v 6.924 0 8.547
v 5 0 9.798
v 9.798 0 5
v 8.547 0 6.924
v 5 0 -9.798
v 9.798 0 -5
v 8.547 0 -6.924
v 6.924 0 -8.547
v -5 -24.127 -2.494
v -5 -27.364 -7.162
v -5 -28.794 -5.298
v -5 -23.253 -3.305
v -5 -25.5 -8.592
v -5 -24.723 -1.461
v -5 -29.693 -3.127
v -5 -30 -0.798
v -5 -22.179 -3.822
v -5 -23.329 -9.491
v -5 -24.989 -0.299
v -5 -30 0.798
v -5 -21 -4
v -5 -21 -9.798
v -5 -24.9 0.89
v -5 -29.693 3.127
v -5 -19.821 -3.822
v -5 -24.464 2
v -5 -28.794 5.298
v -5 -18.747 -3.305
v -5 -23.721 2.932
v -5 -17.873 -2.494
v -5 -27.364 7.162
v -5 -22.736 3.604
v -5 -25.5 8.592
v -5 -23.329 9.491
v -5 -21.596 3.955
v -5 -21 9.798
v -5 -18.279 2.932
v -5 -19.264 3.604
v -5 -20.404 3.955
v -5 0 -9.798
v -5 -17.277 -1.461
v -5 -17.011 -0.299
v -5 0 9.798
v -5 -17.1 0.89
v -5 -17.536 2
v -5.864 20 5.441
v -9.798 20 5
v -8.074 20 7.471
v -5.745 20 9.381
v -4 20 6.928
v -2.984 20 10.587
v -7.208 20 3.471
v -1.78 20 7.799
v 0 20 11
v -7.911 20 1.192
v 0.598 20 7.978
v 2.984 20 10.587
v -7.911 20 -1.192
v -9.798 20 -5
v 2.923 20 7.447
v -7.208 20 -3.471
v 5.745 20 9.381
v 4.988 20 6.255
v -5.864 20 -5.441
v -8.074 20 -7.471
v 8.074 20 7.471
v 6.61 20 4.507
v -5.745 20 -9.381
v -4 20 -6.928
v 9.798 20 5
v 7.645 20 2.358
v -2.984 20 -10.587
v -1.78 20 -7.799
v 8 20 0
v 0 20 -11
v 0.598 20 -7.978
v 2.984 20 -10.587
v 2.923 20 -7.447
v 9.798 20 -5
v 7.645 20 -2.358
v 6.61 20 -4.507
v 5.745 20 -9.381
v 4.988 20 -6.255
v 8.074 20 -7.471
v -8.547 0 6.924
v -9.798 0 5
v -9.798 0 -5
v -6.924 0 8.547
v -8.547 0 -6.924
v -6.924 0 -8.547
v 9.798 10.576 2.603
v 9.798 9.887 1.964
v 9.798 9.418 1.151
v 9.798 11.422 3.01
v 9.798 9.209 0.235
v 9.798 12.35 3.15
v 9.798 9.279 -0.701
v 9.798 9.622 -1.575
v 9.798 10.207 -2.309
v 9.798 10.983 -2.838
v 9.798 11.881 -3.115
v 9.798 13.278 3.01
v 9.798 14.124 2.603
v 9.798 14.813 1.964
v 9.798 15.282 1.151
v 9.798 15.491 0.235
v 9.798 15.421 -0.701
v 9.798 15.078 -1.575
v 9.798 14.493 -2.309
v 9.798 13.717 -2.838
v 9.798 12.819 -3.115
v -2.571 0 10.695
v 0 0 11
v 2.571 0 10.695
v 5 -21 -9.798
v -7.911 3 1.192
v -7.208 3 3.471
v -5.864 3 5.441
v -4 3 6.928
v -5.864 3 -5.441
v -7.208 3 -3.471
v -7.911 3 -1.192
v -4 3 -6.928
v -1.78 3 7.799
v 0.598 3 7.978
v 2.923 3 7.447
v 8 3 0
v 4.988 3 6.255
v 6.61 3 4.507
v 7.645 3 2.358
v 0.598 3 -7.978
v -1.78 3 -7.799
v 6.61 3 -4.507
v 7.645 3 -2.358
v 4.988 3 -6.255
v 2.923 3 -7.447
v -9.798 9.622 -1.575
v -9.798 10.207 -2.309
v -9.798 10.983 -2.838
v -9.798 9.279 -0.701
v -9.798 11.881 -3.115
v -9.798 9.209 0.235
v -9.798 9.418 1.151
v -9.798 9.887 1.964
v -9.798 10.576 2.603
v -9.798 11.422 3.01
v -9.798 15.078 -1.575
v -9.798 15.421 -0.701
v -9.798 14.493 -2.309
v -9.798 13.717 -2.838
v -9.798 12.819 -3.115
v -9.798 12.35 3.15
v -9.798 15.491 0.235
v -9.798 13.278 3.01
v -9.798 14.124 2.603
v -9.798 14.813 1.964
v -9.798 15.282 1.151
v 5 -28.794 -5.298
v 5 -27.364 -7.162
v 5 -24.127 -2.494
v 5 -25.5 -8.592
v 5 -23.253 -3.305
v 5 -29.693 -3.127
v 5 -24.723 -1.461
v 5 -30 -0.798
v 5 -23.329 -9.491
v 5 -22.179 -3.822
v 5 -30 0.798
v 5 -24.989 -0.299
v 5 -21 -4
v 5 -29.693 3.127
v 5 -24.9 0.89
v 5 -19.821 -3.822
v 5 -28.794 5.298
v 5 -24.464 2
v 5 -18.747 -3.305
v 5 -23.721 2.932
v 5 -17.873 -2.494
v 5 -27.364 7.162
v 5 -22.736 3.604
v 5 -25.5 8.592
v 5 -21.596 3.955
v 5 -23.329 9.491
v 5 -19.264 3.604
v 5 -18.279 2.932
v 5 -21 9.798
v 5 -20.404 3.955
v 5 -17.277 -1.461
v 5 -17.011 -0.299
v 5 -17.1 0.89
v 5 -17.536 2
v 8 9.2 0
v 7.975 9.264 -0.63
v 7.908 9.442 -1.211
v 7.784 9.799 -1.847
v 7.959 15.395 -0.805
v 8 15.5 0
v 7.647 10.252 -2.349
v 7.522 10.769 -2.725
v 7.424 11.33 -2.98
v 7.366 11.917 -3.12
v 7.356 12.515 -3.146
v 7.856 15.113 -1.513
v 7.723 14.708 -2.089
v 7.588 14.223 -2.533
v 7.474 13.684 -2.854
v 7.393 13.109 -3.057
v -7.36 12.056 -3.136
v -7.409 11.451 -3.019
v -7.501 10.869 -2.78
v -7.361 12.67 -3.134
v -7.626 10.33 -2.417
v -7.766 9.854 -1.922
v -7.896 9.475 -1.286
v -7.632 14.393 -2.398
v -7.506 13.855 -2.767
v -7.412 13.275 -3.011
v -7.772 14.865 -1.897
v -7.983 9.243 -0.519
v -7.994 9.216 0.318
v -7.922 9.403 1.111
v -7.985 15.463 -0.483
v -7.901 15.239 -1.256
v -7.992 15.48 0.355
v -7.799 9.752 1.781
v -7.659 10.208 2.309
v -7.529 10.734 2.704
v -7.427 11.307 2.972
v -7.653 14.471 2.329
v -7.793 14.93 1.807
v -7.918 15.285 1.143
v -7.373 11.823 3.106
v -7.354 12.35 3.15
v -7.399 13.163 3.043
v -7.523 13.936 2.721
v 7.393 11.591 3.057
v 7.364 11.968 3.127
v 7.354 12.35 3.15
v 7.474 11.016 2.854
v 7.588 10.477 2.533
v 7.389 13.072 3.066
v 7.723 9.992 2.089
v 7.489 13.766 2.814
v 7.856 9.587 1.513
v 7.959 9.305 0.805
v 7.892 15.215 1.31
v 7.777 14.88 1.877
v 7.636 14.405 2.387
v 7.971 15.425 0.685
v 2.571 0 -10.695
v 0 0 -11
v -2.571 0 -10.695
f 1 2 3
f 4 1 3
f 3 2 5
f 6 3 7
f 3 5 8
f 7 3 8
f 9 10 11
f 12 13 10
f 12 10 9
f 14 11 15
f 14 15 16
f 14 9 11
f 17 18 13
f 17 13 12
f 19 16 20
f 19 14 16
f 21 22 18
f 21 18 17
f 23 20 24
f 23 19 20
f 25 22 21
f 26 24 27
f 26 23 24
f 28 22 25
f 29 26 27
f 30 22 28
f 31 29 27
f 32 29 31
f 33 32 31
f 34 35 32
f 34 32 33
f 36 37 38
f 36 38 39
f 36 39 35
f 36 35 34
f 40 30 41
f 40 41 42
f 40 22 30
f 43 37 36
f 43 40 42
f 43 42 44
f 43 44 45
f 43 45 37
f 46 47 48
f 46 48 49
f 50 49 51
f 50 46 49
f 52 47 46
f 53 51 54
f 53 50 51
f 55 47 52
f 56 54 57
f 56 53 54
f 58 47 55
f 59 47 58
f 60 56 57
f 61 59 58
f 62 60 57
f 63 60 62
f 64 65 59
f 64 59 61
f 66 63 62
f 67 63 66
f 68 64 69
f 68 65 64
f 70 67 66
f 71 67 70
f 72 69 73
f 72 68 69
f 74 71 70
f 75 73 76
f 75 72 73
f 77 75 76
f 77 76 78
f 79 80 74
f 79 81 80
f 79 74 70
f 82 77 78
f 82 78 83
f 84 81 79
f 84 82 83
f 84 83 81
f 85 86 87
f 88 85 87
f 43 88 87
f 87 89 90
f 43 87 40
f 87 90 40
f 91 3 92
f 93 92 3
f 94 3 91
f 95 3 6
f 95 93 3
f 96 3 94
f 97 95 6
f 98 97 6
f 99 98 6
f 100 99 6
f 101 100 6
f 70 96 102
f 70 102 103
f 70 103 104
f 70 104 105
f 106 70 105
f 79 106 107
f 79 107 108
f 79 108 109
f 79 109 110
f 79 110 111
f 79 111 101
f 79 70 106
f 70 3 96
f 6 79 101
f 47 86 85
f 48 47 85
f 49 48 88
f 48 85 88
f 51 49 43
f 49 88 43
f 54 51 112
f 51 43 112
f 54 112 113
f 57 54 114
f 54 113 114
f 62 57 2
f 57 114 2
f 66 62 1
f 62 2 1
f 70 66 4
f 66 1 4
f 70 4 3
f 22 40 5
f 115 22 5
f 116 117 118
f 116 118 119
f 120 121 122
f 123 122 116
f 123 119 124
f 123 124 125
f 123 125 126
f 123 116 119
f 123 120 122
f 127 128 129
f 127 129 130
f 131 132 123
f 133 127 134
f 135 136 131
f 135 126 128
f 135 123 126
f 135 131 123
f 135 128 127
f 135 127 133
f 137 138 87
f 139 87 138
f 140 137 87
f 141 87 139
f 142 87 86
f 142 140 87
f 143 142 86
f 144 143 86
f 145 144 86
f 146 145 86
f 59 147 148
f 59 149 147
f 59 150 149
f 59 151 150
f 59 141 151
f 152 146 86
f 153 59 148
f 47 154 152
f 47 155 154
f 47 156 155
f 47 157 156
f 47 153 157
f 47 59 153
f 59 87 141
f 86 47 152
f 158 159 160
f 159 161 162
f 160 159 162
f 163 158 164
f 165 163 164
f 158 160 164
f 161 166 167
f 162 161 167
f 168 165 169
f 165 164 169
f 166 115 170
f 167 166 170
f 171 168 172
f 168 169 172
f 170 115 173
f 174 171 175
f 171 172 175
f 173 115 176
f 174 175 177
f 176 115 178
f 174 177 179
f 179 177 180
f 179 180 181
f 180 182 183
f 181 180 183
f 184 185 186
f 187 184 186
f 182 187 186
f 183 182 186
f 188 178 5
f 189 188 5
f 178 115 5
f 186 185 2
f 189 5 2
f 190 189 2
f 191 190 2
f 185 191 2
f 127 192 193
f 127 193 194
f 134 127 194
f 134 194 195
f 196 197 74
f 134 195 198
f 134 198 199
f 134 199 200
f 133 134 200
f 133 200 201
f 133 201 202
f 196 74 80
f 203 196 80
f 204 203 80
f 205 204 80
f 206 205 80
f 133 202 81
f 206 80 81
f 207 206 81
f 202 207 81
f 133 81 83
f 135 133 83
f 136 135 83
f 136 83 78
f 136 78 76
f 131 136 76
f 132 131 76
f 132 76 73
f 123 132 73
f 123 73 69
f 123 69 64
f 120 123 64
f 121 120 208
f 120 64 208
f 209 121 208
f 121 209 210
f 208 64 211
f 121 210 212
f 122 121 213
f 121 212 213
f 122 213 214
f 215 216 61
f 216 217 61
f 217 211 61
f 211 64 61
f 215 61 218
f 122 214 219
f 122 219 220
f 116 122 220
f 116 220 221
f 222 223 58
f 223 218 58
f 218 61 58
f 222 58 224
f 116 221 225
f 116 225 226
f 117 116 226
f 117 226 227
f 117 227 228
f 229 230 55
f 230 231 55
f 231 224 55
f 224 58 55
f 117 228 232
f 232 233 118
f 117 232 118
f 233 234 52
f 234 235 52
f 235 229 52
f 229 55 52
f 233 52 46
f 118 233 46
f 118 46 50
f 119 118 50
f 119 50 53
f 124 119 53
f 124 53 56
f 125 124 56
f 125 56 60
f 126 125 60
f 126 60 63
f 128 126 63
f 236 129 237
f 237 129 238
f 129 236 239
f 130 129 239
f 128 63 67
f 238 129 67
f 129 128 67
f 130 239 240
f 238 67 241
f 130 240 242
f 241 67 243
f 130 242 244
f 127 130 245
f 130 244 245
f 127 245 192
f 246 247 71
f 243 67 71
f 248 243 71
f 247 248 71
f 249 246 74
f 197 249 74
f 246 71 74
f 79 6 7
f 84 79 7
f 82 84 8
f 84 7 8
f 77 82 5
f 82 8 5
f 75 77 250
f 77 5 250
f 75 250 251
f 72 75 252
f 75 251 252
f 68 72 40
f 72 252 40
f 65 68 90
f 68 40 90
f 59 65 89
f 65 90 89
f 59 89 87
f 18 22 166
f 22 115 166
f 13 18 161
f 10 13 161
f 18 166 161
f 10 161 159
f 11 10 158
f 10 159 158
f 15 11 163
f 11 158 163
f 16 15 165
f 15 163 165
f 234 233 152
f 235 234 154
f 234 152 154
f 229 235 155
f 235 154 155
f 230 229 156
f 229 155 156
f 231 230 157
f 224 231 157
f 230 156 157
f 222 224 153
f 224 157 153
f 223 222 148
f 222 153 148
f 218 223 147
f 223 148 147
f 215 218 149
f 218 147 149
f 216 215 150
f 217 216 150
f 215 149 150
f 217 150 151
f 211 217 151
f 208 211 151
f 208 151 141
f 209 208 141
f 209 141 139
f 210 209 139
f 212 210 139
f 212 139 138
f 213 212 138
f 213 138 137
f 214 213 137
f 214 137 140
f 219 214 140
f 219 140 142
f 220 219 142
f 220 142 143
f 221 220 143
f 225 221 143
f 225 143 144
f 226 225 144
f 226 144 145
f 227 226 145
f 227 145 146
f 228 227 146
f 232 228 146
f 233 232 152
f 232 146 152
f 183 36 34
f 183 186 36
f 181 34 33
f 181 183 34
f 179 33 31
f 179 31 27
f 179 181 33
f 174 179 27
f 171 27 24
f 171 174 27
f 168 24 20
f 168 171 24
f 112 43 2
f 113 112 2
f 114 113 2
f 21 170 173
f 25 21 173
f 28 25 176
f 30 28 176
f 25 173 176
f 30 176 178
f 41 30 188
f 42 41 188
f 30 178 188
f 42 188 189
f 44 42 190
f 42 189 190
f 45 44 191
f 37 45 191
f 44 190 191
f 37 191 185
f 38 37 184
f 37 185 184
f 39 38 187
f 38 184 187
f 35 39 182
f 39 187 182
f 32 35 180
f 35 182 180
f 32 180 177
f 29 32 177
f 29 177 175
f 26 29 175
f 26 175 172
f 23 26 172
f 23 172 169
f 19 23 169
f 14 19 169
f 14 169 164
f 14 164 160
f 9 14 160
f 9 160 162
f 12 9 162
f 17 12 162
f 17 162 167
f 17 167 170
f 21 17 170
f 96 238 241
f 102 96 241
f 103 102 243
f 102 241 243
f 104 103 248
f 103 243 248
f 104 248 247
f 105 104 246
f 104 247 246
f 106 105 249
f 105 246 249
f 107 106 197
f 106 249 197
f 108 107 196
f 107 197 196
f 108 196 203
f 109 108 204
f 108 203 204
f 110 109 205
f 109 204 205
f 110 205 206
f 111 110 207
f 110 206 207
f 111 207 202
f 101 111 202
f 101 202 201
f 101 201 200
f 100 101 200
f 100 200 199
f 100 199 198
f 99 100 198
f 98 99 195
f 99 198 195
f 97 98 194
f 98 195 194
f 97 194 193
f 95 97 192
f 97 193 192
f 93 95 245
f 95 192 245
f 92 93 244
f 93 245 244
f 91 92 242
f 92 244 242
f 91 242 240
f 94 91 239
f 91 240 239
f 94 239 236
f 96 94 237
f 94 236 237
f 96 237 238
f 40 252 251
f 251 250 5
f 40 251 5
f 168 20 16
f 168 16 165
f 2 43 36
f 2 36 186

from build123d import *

# Parameters (mm, degrees)
SKETCH1_R           = 11
BOSS_EXTRUDE1_DEPTH = 20
SKETCH2_R           = 8
CUT_EXTRUDE1_DEPTH  = 17
SKETCH3_W           = 10
SKETCH3_H           = 19.595917942
BOSS_EXTRUDE2_DEPTH = 30
SKETCH4_R           = 4
CUT_EXTRUDE2_DEPTH  = 17
FILLET1_R           = 9
CUT_EXTRUDE3_DEPTH  = 51
SKETCH6_R           = 3.15
CUT_EXTRUDE4_DEPTH  = 20.595917942


with BuildPart() as part:
    # Sketch1 → Boss-Extrude1 (new body)
    with BuildSketch(Plane(origin=(0, 0, 0), x_dir=(1, 0, 0), z_dir=(0, 1, 0))):
        Circle(SKETCH1_R)
    extrude(amount=BOSS_EXTRUDE1_DEPTH)

    # Sketch2 → Cut-Extrude1 (cut)
    with BuildSketch(Plane(origin=(0, 20, 0), x_dir=(1, 0, 0), z_dir=(0, 1, 0))):
        Circle(SKETCH2_R)
    extrude(amount=-CUT_EXTRUDE1_DEPTH, mode=Mode.SUBTRACT)

    # Sketch3 → Boss-Extrude2 (add)
    with BuildSketch(Plane.XZ):
        Rectangle(SKETCH3_W, SKETCH3_H)
    extrude(amount=BOSS_EXTRUDE2_DEPTH)

    # Sketch4 → Cut-Extrude2 (cut, through all)
    with BuildSketch(Plane(origin=(5, 0, 0), x_dir=(0, 0, -1), z_dir=(1, 0, 0))):
        with Locations((0, -21)):
            Circle(SKETCH4_R)
    extrude(amount=-CUT_EXTRUDE2_DEPTH, mode=Mode.SUBTRACT)

    # Fillet1
    fillet1_edges = [part.edges().sort_by_distance(p)[0] for p in [
        (0, -30, 9.797958971),
        (0, -30, -9.797958971),
    ]]
    fillet(fillet1_edges, radius=FILLET1_R)

    # Sketch5 → Cut-Extrude3 (cut, through all)
    with BuildSketch(Plane(origin=(0, 20, 0), x_dir=(1, 0, 0), z_dir=(0, 1, 0))):
        with BuildLine():
            Line((-9.797958971, 5), (-9.797958971, -5))
            ThreePointArc((-9.797958971, -5), (-11, 0), (-9.797958971, 5))
        make_face()
        with BuildLine():
            Line((9.797958971, -5), (9.797958971, 5))
            ThreePointArc((9.797958971, 5), (11, 0), (9.797958971, -5))
        make_face()
    extrude(amount=-CUT_EXTRUDE3_DEPTH, mode=Mode.SUBTRACT)

    # Sketch6 → Cut-Extrude4 (cut, through all)
    with BuildSketch(Plane.ZY.offset(9.797958971)):
        with Locations((0, 12.35)):
            Circle(SKETCH6_R)
    extrude(amount=-CUT_EXTRUDE4_DEPTH, mode=Mode.SUBTRACT)


solid = part.part
